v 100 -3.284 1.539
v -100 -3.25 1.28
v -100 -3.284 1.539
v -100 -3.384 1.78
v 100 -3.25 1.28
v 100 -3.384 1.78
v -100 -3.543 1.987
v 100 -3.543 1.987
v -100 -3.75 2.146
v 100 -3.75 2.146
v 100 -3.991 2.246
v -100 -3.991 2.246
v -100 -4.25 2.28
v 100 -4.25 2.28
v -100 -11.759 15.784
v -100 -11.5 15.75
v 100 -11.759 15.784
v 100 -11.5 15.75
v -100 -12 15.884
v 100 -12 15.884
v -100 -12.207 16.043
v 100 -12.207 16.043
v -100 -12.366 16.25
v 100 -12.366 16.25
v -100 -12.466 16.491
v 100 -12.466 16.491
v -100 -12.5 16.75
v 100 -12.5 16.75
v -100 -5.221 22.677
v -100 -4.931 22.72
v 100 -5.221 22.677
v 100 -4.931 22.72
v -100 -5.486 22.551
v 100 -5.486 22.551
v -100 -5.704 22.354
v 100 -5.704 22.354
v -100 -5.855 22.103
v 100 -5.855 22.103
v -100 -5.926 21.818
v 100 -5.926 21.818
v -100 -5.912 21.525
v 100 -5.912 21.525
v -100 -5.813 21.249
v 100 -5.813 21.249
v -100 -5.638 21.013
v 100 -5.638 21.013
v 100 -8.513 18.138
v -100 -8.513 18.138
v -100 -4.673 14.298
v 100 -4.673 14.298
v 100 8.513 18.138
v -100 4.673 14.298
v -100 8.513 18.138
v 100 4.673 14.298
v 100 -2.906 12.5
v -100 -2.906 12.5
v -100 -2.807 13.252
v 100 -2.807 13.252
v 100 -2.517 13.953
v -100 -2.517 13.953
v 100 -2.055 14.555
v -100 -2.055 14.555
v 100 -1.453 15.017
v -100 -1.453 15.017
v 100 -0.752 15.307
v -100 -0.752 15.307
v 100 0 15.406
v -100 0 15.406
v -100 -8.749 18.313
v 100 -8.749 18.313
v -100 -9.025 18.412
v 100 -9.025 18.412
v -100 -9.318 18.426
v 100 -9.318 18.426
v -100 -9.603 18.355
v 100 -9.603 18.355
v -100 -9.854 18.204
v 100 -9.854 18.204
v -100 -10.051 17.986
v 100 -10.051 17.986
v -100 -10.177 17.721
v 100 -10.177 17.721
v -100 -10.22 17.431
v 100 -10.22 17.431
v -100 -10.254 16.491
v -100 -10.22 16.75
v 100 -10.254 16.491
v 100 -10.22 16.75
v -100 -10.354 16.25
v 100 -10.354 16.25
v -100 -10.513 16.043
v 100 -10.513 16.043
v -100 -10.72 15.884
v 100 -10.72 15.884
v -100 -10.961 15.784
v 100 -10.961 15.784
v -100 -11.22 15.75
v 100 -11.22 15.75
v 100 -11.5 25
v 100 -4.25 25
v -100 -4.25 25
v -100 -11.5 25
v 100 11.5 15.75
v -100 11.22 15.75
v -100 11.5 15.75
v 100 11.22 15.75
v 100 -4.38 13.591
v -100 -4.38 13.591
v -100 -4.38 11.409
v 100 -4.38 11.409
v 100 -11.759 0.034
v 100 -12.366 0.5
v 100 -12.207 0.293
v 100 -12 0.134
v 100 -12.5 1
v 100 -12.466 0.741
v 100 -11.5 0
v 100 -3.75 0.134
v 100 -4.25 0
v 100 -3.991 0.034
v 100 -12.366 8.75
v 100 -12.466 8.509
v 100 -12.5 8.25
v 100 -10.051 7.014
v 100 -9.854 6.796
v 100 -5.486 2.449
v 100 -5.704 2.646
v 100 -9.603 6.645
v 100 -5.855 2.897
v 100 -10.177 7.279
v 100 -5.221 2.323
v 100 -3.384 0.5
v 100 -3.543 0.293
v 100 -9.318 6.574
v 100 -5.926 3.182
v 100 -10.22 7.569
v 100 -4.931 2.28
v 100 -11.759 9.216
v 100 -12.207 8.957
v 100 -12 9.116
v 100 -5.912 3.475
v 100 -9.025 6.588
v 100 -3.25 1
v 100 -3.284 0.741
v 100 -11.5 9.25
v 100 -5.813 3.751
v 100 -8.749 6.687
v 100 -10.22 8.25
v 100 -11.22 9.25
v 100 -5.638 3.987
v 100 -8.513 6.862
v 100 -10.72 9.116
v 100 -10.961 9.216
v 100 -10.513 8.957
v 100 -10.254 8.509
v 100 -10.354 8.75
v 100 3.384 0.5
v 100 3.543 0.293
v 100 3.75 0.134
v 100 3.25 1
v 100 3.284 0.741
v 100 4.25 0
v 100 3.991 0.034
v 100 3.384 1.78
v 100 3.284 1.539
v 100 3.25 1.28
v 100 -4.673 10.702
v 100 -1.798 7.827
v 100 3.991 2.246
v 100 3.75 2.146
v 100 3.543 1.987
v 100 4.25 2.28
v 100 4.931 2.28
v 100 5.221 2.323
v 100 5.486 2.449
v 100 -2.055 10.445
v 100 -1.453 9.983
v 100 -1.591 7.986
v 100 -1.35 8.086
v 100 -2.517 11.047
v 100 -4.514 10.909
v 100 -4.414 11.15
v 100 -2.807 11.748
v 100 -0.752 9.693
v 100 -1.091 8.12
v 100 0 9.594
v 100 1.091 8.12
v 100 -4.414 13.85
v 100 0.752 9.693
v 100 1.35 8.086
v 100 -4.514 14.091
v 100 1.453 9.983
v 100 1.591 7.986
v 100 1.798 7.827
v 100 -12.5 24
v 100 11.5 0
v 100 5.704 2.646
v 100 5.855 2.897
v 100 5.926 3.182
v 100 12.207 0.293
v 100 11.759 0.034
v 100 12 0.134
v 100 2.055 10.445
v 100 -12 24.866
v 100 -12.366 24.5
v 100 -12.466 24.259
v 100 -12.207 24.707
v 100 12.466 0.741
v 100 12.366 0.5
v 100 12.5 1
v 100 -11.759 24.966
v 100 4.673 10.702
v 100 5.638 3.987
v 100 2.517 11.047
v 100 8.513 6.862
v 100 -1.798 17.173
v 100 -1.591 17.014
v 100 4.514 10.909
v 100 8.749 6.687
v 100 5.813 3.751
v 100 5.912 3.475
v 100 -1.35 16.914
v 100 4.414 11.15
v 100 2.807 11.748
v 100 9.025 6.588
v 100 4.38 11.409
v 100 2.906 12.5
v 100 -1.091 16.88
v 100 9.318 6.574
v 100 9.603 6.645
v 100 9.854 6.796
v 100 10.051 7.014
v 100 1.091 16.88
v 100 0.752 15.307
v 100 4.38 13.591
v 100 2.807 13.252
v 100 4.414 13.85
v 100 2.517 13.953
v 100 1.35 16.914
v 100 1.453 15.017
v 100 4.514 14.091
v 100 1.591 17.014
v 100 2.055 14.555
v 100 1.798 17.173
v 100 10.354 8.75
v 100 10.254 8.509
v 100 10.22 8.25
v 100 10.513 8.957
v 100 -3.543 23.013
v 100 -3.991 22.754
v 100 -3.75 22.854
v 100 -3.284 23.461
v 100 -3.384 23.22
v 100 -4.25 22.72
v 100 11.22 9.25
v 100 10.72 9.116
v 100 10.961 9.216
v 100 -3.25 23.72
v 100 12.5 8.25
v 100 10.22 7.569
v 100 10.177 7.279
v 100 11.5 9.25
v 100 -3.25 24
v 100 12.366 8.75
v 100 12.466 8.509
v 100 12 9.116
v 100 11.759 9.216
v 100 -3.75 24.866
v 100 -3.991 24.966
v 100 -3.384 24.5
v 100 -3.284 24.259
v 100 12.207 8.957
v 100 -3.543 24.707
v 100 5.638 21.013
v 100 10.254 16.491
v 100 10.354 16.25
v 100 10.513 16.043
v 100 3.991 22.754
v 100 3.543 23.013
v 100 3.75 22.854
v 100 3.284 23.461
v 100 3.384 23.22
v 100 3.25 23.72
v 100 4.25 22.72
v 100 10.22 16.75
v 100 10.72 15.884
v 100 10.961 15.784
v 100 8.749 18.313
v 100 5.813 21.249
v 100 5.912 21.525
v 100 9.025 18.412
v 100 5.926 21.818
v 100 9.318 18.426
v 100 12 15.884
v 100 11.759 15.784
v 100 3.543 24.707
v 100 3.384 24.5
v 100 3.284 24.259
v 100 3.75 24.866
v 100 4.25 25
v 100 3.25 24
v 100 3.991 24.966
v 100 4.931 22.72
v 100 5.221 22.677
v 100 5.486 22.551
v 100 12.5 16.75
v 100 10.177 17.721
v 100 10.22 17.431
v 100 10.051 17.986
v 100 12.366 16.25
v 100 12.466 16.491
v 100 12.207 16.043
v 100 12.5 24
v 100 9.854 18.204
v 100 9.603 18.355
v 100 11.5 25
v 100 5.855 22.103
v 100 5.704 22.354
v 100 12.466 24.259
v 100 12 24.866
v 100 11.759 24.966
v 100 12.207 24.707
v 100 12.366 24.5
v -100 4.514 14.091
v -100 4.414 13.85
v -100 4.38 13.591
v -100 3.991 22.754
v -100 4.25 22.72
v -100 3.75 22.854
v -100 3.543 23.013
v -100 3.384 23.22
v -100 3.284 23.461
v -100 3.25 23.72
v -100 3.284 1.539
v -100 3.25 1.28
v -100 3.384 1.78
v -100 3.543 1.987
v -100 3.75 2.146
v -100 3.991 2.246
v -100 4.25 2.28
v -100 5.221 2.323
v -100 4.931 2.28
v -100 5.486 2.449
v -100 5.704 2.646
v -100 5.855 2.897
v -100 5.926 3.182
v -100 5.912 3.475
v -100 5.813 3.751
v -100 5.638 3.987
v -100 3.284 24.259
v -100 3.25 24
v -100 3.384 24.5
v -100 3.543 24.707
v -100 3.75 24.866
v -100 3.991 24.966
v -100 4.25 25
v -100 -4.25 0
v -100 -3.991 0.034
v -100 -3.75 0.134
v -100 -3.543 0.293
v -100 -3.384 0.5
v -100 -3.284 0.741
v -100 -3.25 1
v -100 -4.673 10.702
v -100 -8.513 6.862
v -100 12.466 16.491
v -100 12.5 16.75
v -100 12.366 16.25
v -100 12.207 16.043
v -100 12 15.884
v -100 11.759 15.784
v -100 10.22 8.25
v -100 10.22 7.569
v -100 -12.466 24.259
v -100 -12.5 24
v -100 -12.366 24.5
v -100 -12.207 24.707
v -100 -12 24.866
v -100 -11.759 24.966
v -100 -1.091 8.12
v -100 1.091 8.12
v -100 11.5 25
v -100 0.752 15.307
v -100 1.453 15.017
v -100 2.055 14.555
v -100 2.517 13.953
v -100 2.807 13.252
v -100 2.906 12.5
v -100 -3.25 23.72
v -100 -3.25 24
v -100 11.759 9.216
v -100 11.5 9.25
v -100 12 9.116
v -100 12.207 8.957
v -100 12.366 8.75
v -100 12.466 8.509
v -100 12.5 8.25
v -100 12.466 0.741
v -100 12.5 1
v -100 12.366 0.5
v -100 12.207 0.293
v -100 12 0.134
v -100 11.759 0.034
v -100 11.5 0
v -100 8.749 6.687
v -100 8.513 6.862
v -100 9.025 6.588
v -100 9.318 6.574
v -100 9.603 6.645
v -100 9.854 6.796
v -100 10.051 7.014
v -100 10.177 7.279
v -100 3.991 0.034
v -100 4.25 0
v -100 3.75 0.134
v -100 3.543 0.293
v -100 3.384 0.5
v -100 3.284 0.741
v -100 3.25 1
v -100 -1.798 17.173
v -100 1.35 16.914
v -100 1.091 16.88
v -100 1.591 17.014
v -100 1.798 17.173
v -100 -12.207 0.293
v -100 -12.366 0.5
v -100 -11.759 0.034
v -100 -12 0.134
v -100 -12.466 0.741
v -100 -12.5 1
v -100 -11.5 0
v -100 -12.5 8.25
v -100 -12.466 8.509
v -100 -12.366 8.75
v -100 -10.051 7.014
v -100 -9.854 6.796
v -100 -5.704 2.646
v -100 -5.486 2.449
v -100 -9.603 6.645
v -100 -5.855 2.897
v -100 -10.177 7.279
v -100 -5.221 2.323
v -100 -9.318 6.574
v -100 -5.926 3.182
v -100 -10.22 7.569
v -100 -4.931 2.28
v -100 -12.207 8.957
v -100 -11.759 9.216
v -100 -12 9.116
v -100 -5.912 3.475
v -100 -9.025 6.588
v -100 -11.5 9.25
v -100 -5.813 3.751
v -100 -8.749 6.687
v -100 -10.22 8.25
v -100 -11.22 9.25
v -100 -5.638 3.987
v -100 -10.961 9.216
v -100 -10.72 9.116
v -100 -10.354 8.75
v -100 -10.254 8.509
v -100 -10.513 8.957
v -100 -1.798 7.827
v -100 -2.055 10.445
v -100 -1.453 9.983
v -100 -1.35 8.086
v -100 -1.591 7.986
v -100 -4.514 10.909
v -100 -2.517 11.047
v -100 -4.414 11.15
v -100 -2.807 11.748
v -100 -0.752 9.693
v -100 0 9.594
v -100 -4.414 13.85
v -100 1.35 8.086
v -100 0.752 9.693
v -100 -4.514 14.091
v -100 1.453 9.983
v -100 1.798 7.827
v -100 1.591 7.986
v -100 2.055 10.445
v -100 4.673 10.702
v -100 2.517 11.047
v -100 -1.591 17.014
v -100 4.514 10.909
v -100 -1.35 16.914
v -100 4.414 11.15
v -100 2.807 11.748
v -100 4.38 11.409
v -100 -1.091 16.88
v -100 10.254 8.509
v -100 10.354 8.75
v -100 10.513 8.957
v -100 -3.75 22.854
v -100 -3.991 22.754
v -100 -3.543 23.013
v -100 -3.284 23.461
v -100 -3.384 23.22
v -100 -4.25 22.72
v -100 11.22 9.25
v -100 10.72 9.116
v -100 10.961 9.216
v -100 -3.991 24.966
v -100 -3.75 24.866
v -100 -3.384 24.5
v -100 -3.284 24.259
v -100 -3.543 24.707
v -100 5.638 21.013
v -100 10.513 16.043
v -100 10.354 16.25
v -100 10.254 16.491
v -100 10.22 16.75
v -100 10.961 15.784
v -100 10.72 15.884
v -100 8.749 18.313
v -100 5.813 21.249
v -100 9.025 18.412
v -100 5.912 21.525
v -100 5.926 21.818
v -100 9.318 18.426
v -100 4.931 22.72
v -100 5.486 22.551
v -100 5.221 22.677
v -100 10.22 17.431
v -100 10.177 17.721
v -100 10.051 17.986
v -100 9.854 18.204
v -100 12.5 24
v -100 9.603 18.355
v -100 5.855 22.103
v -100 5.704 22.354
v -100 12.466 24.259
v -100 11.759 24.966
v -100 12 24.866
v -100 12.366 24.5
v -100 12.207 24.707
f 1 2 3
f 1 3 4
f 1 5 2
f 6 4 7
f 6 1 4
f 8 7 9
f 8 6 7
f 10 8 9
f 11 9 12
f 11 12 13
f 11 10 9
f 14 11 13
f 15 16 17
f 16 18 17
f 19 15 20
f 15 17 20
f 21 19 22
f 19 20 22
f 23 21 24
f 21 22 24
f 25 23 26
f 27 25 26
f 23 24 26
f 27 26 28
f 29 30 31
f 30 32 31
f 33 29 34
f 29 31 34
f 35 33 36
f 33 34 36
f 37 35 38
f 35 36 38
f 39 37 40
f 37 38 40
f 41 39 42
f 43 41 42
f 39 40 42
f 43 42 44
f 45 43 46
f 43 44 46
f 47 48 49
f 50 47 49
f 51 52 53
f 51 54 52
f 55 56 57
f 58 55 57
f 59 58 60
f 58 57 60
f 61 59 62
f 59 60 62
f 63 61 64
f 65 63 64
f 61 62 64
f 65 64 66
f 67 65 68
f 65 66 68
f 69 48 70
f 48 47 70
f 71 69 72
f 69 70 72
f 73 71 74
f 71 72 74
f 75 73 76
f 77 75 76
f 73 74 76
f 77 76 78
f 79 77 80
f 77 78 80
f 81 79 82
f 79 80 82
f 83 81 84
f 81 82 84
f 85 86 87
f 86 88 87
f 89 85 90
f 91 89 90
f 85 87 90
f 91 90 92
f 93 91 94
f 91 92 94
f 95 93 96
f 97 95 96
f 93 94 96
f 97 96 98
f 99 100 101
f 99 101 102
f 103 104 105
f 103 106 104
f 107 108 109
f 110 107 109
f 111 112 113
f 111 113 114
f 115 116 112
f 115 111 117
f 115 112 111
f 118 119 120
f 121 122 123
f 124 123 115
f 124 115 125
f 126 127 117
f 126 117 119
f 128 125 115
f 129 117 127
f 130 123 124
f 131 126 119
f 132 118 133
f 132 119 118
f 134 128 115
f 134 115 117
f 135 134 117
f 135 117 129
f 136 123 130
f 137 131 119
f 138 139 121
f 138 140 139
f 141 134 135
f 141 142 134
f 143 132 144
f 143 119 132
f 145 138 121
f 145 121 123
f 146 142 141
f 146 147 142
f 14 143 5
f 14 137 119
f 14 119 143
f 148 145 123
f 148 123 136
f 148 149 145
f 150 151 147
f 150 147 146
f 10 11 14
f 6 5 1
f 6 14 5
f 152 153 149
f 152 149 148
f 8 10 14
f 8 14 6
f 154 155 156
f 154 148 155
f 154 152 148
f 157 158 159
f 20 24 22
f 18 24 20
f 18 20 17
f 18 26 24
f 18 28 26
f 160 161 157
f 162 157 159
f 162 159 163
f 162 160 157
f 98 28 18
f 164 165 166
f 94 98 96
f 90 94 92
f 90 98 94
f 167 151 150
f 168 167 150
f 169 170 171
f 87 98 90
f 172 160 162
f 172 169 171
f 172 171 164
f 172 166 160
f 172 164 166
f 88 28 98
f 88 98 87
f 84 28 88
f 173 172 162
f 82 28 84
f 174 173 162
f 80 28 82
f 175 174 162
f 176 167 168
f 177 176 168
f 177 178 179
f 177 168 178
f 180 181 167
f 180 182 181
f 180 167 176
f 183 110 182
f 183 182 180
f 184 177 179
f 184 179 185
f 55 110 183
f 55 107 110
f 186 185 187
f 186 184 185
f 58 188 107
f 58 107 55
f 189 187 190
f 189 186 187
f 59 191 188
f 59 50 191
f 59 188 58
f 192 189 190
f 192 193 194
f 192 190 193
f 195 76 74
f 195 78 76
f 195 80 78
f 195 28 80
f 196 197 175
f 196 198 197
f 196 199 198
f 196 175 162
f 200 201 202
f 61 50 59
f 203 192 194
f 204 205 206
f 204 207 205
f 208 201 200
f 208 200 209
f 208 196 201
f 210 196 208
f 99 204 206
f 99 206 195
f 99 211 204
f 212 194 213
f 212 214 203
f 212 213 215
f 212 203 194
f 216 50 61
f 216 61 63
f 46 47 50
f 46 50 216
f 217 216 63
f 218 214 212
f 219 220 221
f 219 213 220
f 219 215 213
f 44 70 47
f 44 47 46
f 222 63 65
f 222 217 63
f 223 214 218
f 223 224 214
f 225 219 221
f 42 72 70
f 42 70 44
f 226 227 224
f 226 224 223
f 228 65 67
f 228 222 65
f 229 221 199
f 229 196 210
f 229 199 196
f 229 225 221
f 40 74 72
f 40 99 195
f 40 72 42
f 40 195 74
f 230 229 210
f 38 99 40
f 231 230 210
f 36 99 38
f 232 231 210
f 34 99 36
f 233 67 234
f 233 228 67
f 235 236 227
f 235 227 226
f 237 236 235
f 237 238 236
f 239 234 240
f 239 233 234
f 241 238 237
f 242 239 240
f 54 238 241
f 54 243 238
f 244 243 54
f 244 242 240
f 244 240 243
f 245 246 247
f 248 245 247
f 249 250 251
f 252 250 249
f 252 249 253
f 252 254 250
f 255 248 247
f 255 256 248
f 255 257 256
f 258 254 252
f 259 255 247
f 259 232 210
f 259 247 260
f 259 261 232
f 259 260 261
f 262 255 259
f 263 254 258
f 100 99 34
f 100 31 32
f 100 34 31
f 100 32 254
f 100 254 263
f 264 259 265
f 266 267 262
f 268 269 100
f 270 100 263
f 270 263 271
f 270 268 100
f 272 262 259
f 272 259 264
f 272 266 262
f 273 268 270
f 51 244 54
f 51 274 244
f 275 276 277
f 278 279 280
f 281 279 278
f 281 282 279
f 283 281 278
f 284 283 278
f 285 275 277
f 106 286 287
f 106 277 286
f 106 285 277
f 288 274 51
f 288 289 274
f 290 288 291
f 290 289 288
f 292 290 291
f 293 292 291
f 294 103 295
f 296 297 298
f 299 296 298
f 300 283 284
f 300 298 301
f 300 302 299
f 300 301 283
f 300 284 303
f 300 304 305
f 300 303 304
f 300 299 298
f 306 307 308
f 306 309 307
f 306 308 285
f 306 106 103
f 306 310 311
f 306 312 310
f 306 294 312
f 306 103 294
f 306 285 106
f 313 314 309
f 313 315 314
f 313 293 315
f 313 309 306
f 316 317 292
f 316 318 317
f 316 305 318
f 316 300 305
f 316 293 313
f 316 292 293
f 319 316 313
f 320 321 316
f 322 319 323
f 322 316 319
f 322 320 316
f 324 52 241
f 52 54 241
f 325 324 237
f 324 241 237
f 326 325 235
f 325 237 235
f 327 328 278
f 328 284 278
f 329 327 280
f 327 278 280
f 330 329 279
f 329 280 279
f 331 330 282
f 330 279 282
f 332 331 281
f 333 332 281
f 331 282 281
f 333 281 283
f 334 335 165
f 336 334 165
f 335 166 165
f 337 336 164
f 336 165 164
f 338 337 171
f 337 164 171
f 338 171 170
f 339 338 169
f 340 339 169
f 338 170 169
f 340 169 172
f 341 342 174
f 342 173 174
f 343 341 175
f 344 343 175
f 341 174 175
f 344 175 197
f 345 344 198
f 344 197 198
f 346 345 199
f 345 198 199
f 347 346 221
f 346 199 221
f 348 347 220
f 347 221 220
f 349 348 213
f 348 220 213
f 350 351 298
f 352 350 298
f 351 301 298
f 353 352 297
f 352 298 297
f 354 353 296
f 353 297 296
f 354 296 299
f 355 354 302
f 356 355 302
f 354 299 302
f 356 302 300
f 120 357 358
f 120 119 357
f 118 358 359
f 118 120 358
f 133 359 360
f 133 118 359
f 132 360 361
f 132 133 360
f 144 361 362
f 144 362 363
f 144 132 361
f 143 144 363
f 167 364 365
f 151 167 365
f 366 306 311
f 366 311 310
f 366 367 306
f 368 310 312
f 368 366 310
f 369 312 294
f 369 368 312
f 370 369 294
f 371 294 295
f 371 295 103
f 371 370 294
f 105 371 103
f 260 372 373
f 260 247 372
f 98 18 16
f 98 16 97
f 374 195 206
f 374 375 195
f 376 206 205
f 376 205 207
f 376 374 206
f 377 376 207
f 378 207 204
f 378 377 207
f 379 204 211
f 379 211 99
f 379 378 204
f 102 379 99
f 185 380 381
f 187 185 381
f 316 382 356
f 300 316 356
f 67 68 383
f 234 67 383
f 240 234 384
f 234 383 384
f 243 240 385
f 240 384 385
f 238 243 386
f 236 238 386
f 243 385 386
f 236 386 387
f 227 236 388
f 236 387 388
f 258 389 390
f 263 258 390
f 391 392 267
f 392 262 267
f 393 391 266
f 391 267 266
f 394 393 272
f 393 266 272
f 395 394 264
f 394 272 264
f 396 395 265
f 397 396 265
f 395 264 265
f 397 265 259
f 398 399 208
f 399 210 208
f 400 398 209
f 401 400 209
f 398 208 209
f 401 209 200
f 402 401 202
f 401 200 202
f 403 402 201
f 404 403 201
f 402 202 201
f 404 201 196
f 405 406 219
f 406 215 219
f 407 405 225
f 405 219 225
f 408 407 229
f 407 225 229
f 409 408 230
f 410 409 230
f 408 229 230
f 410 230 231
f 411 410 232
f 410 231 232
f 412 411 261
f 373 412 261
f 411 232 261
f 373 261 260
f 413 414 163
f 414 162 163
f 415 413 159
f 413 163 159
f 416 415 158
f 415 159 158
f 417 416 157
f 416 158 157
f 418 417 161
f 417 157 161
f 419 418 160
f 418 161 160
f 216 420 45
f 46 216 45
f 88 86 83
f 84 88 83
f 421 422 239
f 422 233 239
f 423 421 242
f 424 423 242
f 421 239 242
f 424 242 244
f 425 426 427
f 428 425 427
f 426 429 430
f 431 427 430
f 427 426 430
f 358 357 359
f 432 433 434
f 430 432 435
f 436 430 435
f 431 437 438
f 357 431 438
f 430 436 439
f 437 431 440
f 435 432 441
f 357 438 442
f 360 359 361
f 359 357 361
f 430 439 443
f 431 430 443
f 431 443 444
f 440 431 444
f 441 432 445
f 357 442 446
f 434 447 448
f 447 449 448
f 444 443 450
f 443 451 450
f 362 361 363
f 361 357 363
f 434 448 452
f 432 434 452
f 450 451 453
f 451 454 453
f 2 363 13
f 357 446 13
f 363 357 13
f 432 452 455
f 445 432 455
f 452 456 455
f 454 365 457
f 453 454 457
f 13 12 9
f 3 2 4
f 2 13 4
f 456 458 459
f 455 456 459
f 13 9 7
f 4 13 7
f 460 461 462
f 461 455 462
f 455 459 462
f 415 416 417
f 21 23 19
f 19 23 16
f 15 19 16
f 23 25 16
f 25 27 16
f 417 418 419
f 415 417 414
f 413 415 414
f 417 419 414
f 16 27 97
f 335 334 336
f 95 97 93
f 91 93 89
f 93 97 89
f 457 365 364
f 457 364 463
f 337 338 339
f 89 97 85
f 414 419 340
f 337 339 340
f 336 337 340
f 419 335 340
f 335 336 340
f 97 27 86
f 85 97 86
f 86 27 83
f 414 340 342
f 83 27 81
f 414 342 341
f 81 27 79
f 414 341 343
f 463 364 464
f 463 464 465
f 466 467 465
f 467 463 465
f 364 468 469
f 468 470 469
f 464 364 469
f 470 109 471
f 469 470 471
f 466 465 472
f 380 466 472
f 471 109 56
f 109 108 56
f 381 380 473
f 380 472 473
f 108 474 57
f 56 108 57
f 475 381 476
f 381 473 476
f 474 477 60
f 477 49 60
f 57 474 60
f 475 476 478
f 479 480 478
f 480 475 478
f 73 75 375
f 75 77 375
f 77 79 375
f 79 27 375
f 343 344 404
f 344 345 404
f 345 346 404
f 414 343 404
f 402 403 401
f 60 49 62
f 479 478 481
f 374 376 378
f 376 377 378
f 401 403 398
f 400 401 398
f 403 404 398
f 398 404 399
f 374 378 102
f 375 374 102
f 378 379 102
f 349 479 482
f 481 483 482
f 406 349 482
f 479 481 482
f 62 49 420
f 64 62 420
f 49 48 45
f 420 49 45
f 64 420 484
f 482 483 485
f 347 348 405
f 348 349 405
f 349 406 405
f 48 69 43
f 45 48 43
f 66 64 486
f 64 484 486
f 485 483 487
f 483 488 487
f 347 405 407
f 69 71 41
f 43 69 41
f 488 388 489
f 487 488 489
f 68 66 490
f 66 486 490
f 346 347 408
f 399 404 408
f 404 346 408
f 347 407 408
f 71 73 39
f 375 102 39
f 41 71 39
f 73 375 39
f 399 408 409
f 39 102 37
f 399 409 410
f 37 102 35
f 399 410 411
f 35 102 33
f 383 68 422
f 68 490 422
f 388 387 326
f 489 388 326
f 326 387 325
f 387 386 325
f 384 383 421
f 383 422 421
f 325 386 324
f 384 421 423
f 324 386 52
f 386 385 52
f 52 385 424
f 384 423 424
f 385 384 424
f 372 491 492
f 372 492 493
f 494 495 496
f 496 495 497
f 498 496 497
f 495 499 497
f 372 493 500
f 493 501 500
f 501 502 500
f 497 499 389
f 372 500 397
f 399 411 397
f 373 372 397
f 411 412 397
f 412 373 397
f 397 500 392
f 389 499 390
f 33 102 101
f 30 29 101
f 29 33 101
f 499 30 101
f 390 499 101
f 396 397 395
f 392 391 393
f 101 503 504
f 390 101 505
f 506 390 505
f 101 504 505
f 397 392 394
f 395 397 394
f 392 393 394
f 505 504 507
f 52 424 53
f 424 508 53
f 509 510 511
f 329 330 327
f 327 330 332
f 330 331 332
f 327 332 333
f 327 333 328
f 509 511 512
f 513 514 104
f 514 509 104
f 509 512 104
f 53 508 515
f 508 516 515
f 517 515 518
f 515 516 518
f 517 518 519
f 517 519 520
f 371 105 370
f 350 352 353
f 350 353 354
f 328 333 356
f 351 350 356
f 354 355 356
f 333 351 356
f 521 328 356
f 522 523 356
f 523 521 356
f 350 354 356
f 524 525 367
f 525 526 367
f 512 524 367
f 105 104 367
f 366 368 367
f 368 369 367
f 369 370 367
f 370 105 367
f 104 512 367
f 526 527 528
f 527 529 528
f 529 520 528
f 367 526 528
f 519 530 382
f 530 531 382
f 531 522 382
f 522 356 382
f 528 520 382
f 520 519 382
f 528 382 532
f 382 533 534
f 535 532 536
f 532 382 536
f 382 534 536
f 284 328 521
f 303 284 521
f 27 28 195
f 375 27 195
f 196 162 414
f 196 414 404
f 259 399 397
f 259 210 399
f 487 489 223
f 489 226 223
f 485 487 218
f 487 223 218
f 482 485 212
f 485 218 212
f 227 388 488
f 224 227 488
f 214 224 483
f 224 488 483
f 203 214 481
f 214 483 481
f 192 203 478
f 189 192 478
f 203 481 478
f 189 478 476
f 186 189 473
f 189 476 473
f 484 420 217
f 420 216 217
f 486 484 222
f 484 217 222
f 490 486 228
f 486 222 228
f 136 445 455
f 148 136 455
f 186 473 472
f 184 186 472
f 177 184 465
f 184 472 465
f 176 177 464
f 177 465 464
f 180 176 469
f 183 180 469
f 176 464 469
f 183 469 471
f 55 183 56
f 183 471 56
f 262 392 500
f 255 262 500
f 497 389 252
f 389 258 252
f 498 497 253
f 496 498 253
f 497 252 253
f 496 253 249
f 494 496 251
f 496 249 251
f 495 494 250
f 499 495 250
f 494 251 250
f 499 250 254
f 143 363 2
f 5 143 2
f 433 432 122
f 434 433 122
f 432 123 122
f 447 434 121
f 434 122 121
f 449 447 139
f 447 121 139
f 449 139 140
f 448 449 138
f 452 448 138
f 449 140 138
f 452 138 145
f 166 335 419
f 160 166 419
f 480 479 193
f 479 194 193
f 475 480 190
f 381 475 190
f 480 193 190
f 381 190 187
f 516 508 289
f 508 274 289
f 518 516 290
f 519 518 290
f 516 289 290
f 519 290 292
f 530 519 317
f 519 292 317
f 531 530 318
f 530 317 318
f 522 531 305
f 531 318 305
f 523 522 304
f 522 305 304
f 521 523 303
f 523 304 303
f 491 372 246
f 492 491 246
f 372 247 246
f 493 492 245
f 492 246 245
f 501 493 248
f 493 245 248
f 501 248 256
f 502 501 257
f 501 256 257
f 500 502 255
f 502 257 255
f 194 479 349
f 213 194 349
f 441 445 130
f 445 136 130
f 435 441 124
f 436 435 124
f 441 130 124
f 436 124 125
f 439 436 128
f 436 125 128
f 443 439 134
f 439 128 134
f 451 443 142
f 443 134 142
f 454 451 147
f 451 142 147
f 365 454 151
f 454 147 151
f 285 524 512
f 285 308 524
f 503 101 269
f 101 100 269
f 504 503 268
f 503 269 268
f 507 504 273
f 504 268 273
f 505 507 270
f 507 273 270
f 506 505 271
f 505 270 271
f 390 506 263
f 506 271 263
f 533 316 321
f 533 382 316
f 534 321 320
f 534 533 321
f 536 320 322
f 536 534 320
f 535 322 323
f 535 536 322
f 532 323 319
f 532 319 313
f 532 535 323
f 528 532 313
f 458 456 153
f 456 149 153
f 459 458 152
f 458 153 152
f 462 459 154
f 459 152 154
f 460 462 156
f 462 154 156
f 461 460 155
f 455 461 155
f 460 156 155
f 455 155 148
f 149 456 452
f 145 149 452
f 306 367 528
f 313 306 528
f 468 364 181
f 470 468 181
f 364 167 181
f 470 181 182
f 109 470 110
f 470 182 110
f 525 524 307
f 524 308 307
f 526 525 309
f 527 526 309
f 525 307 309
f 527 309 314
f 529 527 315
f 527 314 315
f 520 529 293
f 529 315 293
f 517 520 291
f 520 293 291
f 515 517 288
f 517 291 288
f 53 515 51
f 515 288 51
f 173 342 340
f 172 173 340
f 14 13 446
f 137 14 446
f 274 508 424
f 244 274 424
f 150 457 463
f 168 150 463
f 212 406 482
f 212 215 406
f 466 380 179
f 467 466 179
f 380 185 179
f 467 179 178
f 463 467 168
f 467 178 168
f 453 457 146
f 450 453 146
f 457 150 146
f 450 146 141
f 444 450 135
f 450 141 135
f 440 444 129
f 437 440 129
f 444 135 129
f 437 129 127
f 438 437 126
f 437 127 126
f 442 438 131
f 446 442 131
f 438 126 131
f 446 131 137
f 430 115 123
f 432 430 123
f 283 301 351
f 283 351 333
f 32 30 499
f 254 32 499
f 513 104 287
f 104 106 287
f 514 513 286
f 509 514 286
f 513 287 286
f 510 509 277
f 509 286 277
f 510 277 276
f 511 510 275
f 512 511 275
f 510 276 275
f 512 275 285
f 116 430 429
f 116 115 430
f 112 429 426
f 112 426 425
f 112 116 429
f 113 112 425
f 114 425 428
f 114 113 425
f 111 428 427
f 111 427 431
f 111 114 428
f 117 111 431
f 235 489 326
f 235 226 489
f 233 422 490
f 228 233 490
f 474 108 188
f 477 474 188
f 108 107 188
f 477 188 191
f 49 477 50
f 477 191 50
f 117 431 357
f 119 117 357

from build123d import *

# Parameters (mm, degrees)
F0_W             = 12.5
F0_H             = 25
F1_DEPTH         = 100
F2_W             = 2.28
F2_H             = 3.25
F3_DEPTH         = 200
F3_COPIES_COUNT  = 2
F3_COPIES_ANGLE  = 90
F3_COPIES1_COUNT = 2
F3_COPIES1_ANGLE = 270
F5_R             = 1
F7_R             = 2.5374832391
F8_DEPTH         = 200


# Not quite as in the source:
# - a pattern or mirror of a feature is missing from the dataset's text; its kind, count and spacing are read off the source's solid


with BuildPart() as f1:
    # F0 (on Right) → F1 (new body, symmetric)
    with BuildSketch(Plane.YZ):
        with Locations((-6.25, 12.5)):
            Rectangle(F0_W, F0_H)
        Polygon((0, 0), (12.5, 0), (12.5, 9.25), (10.22, 9.25), (10.22, 5.155), (4.38, 5.155), (4.38, 9.25), (4.38, 10.995), (4.38, 14.005), (4.38, 15.75), (4.38, 19.845), (10.22, 19.845), (10.22, 15.75), (12.5, 15.75), (12.5, 25), (0, 25), align=None)
        Polygon((10.22, 5.155), (6.125, 9.25), (4.38, 9.25), (4.38, 5.155), align=None)
        Polygon((4.38, 9.25), (6.125, 9.25), (4.38, 10.995), align=None)
        Polygon((4.38, 14.005), (6.125, 15.75), (4.38, 15.75), align=None)
        Polygon((4.38, 15.75), (6.125, 15.75), (10.22, 19.845), (4.38, 19.845), align=None)
    extrude(amount=F1_DEPTH, both=True)

    # F2 (on face) → F3 (cut, through all)
    with BuildSketch(Plane(origin=(-100, 0, 0), x_dir=(0, -1, 0), z_dir=(-1, 0, 0))):
        with Locations((11.36, 10.875)):
            Rectangle(F2_W, F2_H)
        with BuildLine():
            Line((0, 15.0374832391), (0, 9.9625167609))
            ThreePointArc((0, 9.9625167609), (1.7942716055, 10.7057283945), (2.5374832391, 12.5))
            ThreePointArc((2.5374832391, 12.5), (1.7942716055, 14.2942716055), (0, 15.0374832391))
        make_face()
        with Locations((11.36, 14.125)):
            Rectangle(F2_W, F2_H)
        Polygon((10.22, 5.155), (10.22, 9.25), (6.125, 9.25), align=None)
        Polygon((6.125, 9.25), (10.22, 9.25), (10.22, 12.5), (10.22, 15.75), (6.125, 15.75), (4.38, 14.005), (4.38, 10.995), align=None)
        Polygon((6.125, 15.75), (10.22, 15.75), (10.22, 19.845), align=None)
    f3 = extrude(amount=-F3_DEPTH, mode=Mode.SUBTRACT)

    # F3_copies: F3 ×2 about axis
    f3_copies_axis = Axis((0, 0, 12.5), (1, 0, 0))
    for i in range(1, F3_COPIES_COUNT):
        add(f3.rotate(f3_copies_axis, i * F3_COPIES_ANGLE / (F3_COPIES_COUNT - 1)), mode=Mode.SUBTRACT)

    # F3_copies1: F3 ×2 about axis
    f3_copies1_axis = Axis((0, 0, 12.5), (1, 0, 0))
    for i in range(1, F3_COPIES1_COUNT):
        add(f3.rotate(f3_copies1_axis, i * F3_COPIES1_ANGLE / (F3_COPIES1_COUNT - 1)), mode=Mode.SUBTRACT)

    # F5
    f5_edges = [f1.edges().sort_by_distance(p)[0] for p in [
        (0, -4.38, 14.005),
        (0, -4.38, 10.995),
        (0, -10.22, 19.845),
        (0, -10.22, 15.75),
        (0, -12.5, 15.75),
        (0, -12.5, 9.25),
        (0, -10.22, 9.25),
        (0, -10.22, 5.155),
        (0, 12.5, 25),
        (0, -12.5, 25),
        (0, -12.5, 0),
        (0, 12.5, 0),
        (0, 10.22, 19.845),
        (0, 10.22, 15.75),
        (0, 4.38, 14.005),
        (0, 4.38, 10.995),
        (0, 10.22, 5.155),
        (0, 10.22, 9.25),
        (0, 12.5, 9.25),
        (0, 3.25, 0),
        (0, 3.25, 2.28),
        (0, 7.345, 2.28),
        (0, 1.505, 8.12),
        (0, -1.505, 8.12),
        (0, -7.345, 2.28),
        (0, -3.25, 2.28),
        (0, -3.25, 0),
        (0, -3.25, 22.72),
        (0, -3.25, 25),
        (0, -7.345, 22.72),
        (0, -1.505, 16.88),
        (0, 1.505, 16.88),
        (0, 7.345, 22.72),
        (0, 3.25, 22.72),
        (0, 3.25, 25),
        (0, 12.5, 15.75),
    ]]
    fillet(f5_edges, radius=F5_R)

    # F7 (on face) → F8 (cut, through all)
    with BuildSketch(Plane(origin=(-100, 0, 0), x_dir=(0, -1, 0), z_dir=(-1, 0, 0))):
        with BuildLine():
            ThreePointArc((0, 9.5939878347), (2.0548609083, 10.4451390917), (2.9060121653, 12.5))
            ThreePointArc((2.9060121653, 12.5), (2.0548609083, 14.5548609083), (0, 15.4060121653))
            ThreePointArc((0, 15.4060121653), (-2.0548609083, 14.5548609083), (-2.9060121653, 12.5))
            ThreePointArc((-2.9060121653, 12.5), (-2.0548609083, 10.4451390917), (0, 9.5939878347))
        make_face()
        with Locations((0, 12.5)):
            Circle(F7_R, mode=Mode.SUBTRACT)
    extrude(amount=-F8_DEPTH, mode=Mode.SUBTRACT)


solid = f1.part
